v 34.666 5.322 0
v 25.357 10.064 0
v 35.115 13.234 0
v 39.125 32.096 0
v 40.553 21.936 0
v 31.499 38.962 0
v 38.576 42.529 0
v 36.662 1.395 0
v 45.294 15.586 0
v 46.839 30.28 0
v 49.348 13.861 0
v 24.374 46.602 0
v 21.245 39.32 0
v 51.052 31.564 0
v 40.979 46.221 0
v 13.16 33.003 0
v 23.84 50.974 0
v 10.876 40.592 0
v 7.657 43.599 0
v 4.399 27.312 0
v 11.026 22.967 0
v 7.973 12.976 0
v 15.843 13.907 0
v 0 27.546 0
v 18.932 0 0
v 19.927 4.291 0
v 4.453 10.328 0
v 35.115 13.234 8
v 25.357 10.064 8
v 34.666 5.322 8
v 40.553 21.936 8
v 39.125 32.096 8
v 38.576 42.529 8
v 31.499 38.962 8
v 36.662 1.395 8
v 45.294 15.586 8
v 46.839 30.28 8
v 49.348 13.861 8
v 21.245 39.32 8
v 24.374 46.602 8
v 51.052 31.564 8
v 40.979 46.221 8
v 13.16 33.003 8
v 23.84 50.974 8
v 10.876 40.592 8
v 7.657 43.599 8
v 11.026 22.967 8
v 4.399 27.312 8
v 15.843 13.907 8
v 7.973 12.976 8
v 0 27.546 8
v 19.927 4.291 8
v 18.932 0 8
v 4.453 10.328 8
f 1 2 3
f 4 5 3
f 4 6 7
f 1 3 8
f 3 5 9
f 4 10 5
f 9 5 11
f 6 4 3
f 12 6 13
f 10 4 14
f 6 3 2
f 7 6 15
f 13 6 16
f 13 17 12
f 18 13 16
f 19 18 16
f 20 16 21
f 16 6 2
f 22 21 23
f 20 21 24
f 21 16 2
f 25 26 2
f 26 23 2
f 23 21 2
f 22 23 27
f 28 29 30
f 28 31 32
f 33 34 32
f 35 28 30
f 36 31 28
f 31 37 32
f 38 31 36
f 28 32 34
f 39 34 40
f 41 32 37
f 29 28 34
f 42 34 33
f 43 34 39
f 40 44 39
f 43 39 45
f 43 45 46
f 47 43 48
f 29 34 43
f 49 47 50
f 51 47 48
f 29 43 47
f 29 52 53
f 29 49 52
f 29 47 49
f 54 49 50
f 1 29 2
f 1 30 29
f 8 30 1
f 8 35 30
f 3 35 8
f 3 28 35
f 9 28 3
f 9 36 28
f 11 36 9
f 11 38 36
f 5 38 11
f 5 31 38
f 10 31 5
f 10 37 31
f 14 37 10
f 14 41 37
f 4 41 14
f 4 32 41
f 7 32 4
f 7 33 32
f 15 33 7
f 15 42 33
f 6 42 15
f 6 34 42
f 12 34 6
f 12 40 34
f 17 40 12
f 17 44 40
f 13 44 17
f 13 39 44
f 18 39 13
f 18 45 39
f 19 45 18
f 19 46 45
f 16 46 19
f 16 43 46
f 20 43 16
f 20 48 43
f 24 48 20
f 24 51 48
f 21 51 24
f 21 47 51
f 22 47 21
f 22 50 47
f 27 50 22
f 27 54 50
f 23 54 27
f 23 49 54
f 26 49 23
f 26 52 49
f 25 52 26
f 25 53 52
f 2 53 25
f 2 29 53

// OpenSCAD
$fn = 32;

// ----------------------------------------------------------------------
// Fan rotor section: 9 blades, 15 mm hub radius, 11 mm blades
// ----------------------------------------------------------------------

// --- parameters (mm) ---
profile_height = 8;       // extrusion height
profile_points = 27;      // points of the closed outline

profile = [[40.553, 21.936], [46.839, 30.28], [51.052, 31.564], [39.125, 32.096], [38.576, 42.529], [40.979, 46.221], [31.499, 38.962], [24.374, 46.602], [23.84, 50.974], [21.245, 39.32], [10.876, 40.592], [7.657, 43.599], [13.16, 33.003], [4.399, 27.312], [0, 27.546], [11.026, 22.967], [7.973, 12.976], [4.453, 10.328], [15.843, 13.907], [19.927, 4.291], [18.932, 0], [25.357, 10.064], [34.666, 5.322], [36.662, 1.395], [35.115, 13.234], [45.294, 15.586], [49.348, 13.861]];  // single closed polygon, 27 points, counter clockwise

// --- the one profile operation ---
linear_extrude(height = profile_height) polygon(points = profile);
